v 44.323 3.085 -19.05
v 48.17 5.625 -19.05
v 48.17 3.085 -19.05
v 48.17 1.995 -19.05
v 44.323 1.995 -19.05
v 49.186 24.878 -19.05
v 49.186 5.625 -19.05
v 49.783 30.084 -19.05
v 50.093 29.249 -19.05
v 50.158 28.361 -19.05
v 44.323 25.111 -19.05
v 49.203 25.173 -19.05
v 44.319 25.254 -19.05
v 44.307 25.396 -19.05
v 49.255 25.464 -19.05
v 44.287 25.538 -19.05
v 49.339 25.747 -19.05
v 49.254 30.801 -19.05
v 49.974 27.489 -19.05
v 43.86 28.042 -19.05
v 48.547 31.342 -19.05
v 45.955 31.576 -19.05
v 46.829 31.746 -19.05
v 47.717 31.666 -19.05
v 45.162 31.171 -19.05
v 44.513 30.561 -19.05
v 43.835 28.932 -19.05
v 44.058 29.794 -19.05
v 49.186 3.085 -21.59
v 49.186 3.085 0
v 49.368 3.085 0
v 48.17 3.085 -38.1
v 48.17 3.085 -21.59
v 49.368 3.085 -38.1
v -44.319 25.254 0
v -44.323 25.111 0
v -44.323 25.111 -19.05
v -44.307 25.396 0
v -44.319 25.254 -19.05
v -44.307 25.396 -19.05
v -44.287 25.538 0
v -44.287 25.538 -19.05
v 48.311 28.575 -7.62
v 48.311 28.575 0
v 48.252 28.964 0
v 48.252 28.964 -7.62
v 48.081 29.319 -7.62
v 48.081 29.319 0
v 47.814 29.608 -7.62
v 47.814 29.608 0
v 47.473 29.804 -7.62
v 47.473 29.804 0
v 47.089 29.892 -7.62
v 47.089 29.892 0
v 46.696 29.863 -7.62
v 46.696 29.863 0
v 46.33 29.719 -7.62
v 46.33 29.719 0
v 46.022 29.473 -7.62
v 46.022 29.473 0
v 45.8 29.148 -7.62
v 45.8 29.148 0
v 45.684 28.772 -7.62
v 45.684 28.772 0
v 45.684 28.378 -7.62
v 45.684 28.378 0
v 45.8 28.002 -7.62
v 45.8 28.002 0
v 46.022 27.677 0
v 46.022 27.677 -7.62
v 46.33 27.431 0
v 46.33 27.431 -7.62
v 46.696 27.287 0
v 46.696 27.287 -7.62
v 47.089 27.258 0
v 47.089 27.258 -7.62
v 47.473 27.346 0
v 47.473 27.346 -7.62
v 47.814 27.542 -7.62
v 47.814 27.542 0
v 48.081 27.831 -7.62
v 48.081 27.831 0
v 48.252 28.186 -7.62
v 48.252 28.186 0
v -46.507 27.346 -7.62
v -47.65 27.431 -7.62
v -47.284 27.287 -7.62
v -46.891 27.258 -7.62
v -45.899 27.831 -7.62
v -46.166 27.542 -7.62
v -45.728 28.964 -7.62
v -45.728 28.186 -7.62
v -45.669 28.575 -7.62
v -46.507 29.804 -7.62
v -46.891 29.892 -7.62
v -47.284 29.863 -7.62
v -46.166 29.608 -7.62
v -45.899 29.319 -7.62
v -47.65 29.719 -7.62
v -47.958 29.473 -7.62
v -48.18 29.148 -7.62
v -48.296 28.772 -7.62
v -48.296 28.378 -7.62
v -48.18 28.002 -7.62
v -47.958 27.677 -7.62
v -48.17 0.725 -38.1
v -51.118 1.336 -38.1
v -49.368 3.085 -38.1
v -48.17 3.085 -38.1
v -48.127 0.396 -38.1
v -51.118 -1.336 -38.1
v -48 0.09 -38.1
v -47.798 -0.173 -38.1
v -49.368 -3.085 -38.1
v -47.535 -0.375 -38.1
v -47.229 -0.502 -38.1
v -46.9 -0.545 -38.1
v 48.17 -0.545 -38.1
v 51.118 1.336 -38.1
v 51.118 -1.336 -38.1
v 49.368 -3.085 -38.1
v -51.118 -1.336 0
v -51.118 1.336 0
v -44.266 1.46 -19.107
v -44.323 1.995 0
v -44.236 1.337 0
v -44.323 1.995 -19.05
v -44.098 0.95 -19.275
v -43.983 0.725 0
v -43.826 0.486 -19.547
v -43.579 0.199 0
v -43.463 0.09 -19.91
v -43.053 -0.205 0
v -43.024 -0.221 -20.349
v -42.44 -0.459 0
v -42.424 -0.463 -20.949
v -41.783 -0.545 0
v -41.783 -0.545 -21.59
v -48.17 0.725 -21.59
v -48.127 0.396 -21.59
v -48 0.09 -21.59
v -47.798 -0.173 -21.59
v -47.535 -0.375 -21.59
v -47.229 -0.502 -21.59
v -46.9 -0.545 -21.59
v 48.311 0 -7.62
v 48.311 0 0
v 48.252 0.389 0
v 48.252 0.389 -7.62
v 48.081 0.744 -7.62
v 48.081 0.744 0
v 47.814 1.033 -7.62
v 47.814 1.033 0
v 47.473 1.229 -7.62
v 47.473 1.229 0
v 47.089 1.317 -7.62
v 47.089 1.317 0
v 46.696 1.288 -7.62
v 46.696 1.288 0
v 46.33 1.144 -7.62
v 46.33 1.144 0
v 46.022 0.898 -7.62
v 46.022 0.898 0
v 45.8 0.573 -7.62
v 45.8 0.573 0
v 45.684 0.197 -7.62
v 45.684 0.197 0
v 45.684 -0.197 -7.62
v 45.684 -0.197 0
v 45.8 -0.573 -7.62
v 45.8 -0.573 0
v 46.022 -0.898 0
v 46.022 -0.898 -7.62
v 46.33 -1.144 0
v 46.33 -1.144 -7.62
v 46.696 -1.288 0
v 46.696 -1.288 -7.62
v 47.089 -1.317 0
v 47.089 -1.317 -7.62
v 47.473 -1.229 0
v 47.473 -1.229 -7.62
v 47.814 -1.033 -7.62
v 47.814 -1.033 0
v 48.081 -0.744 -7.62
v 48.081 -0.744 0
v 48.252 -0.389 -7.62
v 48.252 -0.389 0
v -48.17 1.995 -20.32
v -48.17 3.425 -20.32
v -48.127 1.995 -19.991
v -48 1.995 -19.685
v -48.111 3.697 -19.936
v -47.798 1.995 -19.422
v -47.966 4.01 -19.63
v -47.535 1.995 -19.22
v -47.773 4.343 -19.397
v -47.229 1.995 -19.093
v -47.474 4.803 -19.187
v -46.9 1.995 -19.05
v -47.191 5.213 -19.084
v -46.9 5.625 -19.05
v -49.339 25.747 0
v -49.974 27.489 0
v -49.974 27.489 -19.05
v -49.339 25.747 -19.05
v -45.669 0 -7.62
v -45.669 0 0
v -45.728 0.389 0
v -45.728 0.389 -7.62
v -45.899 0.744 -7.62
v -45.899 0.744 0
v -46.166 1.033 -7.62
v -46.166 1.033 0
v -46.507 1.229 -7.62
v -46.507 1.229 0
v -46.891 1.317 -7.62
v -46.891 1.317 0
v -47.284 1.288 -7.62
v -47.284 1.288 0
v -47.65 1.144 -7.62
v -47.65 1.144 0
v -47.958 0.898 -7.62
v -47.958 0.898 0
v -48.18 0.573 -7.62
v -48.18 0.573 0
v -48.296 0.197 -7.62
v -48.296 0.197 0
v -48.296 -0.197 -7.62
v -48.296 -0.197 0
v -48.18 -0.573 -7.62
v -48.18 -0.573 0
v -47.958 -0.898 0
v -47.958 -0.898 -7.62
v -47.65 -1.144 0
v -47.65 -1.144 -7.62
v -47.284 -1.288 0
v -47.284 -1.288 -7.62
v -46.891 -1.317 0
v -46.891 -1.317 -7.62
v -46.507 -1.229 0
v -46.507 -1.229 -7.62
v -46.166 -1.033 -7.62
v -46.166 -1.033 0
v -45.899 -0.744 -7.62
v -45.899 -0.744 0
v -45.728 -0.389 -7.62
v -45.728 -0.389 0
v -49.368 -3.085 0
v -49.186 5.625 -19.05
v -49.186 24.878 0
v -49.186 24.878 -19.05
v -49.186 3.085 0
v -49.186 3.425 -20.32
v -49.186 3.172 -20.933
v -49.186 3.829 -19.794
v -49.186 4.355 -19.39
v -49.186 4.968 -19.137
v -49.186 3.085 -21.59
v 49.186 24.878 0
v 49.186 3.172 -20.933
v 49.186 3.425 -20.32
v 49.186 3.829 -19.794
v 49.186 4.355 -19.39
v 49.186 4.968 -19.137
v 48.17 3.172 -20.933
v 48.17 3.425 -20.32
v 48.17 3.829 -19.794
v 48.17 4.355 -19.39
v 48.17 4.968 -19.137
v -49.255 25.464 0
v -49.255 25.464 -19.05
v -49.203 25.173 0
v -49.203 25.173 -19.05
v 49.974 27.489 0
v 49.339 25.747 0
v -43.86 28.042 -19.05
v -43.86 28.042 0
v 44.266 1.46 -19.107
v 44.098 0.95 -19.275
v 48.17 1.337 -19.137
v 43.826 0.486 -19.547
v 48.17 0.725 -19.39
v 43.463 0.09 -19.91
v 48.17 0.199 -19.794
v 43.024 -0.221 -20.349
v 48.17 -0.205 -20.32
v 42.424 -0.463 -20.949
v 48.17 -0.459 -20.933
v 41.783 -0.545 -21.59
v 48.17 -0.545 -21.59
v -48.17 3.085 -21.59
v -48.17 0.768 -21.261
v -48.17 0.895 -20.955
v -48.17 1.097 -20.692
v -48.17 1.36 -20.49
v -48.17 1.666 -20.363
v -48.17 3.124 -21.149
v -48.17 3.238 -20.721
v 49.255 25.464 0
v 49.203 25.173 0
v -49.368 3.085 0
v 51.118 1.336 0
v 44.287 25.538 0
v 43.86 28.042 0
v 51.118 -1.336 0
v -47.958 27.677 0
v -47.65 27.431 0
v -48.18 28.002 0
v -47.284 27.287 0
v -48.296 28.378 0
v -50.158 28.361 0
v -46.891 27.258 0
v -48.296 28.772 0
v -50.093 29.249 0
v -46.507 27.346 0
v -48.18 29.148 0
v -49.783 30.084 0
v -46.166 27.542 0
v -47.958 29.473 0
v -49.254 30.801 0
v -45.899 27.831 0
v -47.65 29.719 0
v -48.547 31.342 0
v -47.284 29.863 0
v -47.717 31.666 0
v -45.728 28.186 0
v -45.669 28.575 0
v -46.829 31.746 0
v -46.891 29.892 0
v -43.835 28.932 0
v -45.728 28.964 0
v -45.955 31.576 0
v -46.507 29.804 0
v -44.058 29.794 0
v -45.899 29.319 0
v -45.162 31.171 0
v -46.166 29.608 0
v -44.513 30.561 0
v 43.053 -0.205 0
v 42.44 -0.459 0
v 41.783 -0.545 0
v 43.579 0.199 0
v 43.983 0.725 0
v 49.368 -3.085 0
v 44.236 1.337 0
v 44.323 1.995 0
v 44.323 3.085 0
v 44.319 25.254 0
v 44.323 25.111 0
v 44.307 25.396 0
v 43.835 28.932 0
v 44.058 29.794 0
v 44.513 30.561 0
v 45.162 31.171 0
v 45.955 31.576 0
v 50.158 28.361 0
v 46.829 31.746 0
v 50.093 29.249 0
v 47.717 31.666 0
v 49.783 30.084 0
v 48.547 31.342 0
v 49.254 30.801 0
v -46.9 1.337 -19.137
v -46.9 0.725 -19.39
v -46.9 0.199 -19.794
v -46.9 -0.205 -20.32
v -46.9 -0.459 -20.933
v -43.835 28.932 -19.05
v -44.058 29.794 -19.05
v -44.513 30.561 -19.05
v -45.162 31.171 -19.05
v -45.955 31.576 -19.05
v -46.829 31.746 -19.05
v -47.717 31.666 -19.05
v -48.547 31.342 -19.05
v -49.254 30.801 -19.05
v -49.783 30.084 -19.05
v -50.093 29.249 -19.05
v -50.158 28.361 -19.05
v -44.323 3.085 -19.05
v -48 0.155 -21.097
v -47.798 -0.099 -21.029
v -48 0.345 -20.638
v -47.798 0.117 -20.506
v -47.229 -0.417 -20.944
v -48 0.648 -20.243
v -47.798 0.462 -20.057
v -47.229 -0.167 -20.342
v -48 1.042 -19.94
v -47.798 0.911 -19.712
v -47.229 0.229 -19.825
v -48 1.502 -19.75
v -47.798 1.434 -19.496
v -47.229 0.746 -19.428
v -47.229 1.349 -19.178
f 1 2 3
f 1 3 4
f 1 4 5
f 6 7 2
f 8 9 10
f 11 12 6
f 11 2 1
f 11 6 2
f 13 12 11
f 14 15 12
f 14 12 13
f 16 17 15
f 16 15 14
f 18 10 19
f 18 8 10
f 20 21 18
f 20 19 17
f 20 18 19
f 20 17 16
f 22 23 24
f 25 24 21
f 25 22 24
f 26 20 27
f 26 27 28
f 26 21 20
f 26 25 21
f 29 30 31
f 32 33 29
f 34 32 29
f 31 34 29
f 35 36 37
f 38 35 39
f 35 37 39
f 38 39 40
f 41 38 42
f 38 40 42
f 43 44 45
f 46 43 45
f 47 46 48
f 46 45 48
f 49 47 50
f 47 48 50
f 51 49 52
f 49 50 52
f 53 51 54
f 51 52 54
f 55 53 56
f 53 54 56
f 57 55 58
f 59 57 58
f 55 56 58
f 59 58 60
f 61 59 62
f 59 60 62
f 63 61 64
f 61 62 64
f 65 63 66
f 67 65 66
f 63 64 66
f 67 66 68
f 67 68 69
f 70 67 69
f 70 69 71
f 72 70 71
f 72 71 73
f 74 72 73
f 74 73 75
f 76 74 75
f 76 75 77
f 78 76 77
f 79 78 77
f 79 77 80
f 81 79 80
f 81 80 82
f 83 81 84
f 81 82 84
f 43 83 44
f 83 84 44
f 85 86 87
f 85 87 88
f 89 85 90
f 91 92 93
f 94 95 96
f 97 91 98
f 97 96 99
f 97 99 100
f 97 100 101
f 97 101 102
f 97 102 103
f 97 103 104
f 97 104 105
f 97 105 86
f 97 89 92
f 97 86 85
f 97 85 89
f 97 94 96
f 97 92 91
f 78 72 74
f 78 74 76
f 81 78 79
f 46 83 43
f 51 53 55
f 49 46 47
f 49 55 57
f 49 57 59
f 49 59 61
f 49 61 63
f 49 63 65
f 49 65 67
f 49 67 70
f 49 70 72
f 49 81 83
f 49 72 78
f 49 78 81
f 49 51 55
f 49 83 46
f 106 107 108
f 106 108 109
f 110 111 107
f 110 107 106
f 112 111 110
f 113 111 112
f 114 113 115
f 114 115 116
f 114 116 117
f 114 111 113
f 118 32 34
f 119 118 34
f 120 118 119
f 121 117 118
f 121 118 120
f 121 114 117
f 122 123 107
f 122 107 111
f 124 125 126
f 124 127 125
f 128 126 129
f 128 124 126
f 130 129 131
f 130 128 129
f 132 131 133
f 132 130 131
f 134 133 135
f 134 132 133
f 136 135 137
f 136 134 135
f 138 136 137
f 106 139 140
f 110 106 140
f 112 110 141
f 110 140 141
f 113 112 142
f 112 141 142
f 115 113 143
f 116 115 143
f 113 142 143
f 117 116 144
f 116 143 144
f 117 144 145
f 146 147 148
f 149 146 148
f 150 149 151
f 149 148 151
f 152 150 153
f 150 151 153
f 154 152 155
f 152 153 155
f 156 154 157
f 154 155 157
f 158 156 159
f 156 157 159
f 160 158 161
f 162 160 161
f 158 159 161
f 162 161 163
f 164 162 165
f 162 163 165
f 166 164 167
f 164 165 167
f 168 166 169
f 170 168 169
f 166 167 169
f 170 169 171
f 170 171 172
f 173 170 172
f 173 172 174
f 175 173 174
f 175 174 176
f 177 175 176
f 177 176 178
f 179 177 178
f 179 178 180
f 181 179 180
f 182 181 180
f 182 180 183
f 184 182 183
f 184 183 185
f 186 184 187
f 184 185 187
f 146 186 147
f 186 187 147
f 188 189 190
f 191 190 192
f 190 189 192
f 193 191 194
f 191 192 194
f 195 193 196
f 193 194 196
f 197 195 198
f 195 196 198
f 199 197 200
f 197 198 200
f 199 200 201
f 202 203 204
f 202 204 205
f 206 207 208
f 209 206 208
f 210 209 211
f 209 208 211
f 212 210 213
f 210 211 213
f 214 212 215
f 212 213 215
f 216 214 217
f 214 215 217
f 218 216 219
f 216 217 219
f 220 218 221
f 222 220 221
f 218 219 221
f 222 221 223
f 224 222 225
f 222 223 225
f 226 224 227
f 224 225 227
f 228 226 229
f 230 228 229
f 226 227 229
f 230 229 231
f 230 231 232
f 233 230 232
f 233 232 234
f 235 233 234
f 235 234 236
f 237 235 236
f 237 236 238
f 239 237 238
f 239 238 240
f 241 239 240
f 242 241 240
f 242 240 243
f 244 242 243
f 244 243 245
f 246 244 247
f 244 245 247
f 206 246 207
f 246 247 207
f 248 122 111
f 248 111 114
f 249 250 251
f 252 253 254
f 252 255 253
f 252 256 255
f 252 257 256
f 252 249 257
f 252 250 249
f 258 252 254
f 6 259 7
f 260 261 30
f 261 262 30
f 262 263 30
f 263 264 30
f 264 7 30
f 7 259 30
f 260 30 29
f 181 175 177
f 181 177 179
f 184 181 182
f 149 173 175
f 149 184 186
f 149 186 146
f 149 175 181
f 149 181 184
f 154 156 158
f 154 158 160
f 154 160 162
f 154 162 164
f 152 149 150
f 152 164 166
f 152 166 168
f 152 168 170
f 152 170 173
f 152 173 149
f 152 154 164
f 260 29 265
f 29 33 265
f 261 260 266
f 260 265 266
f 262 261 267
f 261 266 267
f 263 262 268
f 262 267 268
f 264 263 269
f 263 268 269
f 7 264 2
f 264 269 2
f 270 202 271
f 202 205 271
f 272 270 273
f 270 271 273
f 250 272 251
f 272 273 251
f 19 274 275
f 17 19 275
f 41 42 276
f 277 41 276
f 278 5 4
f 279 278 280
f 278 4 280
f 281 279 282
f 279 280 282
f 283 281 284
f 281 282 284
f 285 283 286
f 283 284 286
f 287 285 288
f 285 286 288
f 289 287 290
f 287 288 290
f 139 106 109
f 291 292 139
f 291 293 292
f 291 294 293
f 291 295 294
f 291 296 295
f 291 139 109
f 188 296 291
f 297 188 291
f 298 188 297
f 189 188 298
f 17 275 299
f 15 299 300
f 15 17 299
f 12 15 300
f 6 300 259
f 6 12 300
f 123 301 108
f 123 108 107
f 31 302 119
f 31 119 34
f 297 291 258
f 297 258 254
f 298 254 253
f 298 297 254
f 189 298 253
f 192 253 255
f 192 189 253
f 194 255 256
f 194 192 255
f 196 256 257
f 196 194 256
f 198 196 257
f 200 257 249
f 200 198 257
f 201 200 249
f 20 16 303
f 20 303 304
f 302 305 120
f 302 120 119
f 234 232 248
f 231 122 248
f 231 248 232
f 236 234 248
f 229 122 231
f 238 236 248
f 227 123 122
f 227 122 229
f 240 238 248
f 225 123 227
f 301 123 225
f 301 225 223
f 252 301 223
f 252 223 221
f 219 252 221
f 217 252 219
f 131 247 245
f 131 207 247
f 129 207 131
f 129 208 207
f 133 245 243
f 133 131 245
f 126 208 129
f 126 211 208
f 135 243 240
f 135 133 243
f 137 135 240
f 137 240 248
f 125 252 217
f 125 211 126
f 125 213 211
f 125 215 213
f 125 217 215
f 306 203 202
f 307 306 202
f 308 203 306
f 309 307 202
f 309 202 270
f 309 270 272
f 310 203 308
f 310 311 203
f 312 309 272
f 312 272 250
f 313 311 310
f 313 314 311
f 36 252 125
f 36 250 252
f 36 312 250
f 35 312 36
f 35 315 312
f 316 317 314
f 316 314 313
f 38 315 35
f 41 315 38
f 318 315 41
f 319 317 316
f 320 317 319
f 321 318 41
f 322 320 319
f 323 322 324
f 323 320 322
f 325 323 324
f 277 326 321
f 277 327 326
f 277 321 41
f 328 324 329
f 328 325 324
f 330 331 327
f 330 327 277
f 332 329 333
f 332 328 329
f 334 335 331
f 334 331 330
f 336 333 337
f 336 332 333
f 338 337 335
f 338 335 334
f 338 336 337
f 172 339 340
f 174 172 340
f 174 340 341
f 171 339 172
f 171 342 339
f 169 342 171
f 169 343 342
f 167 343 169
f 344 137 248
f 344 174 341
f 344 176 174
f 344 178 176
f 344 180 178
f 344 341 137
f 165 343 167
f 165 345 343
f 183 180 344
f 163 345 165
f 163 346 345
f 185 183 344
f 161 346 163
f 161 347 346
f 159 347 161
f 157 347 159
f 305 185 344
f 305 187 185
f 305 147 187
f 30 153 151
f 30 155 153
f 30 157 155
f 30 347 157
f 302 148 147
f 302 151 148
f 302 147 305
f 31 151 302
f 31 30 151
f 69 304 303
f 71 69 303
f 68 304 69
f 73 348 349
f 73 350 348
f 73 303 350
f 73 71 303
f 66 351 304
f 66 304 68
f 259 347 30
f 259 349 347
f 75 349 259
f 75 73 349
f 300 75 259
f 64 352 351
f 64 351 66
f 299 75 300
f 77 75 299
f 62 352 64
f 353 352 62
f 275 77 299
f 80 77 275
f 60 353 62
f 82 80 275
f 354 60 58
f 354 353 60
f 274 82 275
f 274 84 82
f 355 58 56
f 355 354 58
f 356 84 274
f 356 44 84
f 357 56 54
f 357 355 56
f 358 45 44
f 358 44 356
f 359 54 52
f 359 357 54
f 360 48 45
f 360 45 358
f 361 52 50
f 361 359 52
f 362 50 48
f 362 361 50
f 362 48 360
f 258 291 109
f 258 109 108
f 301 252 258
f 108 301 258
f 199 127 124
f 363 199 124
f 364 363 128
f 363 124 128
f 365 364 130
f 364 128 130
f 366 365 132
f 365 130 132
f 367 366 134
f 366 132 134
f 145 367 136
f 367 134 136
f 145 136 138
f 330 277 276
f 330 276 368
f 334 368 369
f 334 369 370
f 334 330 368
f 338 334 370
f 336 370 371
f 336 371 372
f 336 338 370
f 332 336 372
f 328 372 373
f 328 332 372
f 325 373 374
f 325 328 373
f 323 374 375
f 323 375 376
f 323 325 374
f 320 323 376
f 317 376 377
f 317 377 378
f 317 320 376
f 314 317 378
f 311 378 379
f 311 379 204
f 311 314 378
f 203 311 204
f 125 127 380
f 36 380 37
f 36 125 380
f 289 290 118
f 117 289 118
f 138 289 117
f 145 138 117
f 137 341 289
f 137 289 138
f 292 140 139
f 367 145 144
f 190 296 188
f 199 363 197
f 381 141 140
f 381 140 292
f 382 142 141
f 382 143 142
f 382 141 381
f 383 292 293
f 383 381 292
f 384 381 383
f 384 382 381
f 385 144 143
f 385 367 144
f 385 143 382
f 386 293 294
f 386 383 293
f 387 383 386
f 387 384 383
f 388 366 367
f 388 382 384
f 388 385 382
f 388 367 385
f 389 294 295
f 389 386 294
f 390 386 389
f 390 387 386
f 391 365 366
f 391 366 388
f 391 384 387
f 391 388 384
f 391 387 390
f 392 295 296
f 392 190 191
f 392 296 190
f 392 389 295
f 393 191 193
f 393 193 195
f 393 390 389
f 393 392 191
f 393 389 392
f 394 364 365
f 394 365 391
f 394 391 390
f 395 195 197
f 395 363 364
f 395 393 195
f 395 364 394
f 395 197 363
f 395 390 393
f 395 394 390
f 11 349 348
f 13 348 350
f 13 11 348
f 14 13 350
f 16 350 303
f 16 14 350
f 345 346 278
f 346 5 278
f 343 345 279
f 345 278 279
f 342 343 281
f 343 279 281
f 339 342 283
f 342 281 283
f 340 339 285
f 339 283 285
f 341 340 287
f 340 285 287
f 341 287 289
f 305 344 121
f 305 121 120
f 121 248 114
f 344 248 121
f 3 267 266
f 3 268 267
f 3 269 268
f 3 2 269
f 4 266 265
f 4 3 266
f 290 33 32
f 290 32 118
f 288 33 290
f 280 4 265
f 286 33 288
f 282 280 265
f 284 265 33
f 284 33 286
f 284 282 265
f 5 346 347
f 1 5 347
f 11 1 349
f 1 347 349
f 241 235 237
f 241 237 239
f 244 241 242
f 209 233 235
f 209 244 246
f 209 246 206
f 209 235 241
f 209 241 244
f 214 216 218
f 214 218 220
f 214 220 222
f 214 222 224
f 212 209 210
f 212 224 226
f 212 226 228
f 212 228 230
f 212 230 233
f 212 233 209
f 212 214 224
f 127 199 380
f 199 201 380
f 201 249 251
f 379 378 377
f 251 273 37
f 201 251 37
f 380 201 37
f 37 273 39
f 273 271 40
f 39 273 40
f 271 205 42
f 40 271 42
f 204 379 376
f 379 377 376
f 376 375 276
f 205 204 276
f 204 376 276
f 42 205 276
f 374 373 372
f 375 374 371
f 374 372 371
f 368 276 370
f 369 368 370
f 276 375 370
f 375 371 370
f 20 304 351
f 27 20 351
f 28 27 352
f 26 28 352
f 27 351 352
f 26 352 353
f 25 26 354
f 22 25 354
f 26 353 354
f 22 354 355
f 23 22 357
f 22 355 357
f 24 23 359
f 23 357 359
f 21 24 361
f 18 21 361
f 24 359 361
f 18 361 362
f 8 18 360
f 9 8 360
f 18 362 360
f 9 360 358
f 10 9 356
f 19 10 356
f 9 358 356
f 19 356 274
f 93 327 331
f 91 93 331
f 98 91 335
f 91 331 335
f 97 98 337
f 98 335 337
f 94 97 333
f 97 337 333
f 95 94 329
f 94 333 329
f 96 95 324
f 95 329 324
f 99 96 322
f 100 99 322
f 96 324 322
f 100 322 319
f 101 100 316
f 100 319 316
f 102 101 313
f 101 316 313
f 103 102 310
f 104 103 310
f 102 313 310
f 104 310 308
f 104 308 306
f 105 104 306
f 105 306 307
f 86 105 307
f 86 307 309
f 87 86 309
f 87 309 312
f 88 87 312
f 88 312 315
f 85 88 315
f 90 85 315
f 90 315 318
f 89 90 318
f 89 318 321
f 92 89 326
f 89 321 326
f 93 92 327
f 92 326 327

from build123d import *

# Parameters (mm, degrees)
BOSS_EXTRUDE1_DEPTH      = 101.6
SKETCH3_W                = 19.05
SKETCH3_H                = 15.24
BOSS_EXTRUDE3_DEPTH      = 2.54
BOSS_EXTRUDE4_DEPTH      = 3.175
SKETCH5_R                = 3.96875
CUT_EXTRUDE1_DEPTH       = 113.522583006
SKETCH18_W               = 3.847197439
SKETCH18_H               = 19.05
BOSS_EXTRUDE9_DEPTH      = 3.630394878
BOSS_EXTRUDE17_DEPTH     = 19.05
SKETCH20_R               = 1.3208
CUT_EXTRUDE7_DEPTH       = 7.62
FILLET3_R                = 2.54
FILLET4_R                = 2.54
CUT_EXTRUDE19_DEPTH      = 119.165702994
FILLET12_R               = 0.508
FILLET24_R               = 1.27
CUT_EXTRUDE20_DEPTH      = 119.230869843
CUT_EXTRUDE20_DEPTH_BACK = 119.230869843
SKETCH41_W               = 159.957489038
SKETCH41_H               = 86.494386596


with BuildPart() as part:
    # Sketch1 → Boss-Extrude1 (new body)
    with BuildSketch(Plane.XY):
        Polygon((-49.440197439, 3.085197439), (-51.308, 1.217394878), (-51.308, -1.217394878), (-49.440197439, -3.085197439), (49.440197439, -3.085197439), (51.308, -1.217394878), (51.308, 1.217394878), (49.440197439, 3.085197439), (48.170197439, 3.085197439), (48.170197439, -0.545197439), (-48.170197439, -0.545197439), (-48.170197439, 3.085197439), align=None)
    extrude(amount=-BOSS_EXTRUDE1_DEPTH)

    # Sketch3 → Boss-Extrude3 (add)
    with BuildSketch(Plane(origin=(0, 0, -101.6), x_dir=(-1, 0, 0), z_dir=(0, 0, -1))):
        with Locations((38.645197439, 7.074802561)):
            Rectangle(SKETCH3_W, SKETCH3_H)
    extrude(amount=-BOSS_EXTRUDE3_DEPTH)

    # Sketch4 → Boss-Extrude4 (add)
    with BuildSketch(Plane(origin=(-29.120197439, 0, 0), x_dir=(0, 0, -1), z_dir=(1, 0, 0))):
        Polygon((99.06, 14.694802561), (83.82, -0.545197439), (99.06, -0.545197439), align=None)
    boss_extrude4 = extrude(amount=-BOSS_EXTRUDE4_DEPTH)

    # Mirror1: Boss-Extrude4 across plane
    add(boss_extrude4.mirror(Plane(origin=(-38.645197439, 0, 0), x_dir=(0, 0, 1), z_dir=(1, 0, 0))))

    # Sketch5 → Cut-Extrude1 (cut, through all)
    with BuildSketch(Plane.XY.offset(-99.06)):
        with Locations((-38.6334, 6.985)):
            Circle(SKETCH5_R)
    extrude(amount=-CUT_EXTRUDE1_DEPTH, mode=Mode.SUBTRACT)

    # Sketch18 → Boss-Extrude9 (add)
    with BuildSketch(Plane(origin=(0, 3.085197439, 0), x_dir=(1, 0, 0), z_dir=(0, 1, 0))):
        with Locations((46.246598719, 9.525)):
            Rectangle(SKETCH18_W, SKETCH18_H)
        with Locations((-46.246598719, 9.525)):
            Rectangle(SKETCH18_W, SKETCH18_H)
    extrude(amount=-BOSS_EXTRUDE9_DEPTH)

    # Sketch39 → Boss-Extrude17 (add)
    with BuildSketch(Plane.XY):
        with BuildLine():
            Line((49.186197439, 3.085197439), (44.323, 3.085197439))
            Line((44.323, 3.085197439), (44.323, 25.325923901))
            Line((44.323, 25.325923901), (43.86013816, 28.041530355))
            ThreePointArc((43.86013816, 28.041530355), (47.275748779, 31.737115215), (49.973524071, 27.489086045))
            Line((49.973524071, 27.489086045), (49.186197439, 25.325923901))
            Line((49.186197439, 25.325923901), (49.186197439, 3.085197439))
        make_face()
    boss_extrude17 = extrude(amount=-BOSS_EXTRUDE17_DEPTH)

    # Mirror5: Boss-Extrude17 across plane
    add(boss_extrude17.mirror(Plane(origin=(0, 0, 0), x_dir=(0, 0, 1), z_dir=(1, 0, 0))))

    # Sketch20 → Cut-Extrude7 (cut)
    with BuildSketch(Plane.XY):
        with Locations((46.99, 0)):
            Circle(SKETCH20_R)
        with Locations((-46.99, 0)):
            Circle(SKETCH20_R)
        with Locations((-46.99, 28.575)):
            Circle(SKETCH20_R)
        with Locations((46.99, 28.575)):
            Circle(SKETCH20_R)
    extrude(amount=-CUT_EXTRUDE7_DEPTH, mode=Mode.SUBTRACT)

    # Fillet3
    fillet3_edges = [part.edges().sort_by_distance(p)[0] for p in [
        (44.323, 25.325923901, -9.525),
        (49.186197439, 25.325923901, -9.525),
        (-49.186197439, 25.325923901, -9.525),
        (-44.323, 25.325923901, -9.525),
    ]]
    fillet(fillet3_edges, radius=FILLET3_R)

    # Fillet4
    fillet4_edges = [part.edges().sort_by_distance(p)[0] for p in [
        (48.678197439, 3.085197439, -19.05),
        (-48.678197439, 3.085197439, -19.05),
        (44.323, -0.545197439, -9.525),
        (46.246598719, -0.545197439, -19.05),
        (-46.246598719, -0.545197439, -19.05),
        (-44.323, -0.545197439, -9.525),
    ]]
    fillet(fillet4_edges, radius=FILLET4_R)

    # Sketch40 → Cut-Extrude19 (cut, through all)
    with BuildSketch(Plane.XY):
        Polygon((-49.36835539, 3.085197439), (-51.1175, 1.336052829), (-51.1175, -1.336052829), (-49.36835539, -3.085197439), (-52.3875, -3.085197439), (-52.3875, 3.085197439), align=None)
        Polygon((52.3875, 3.085197439), (52.3875, -3.085197439), (49.36835539, -3.085197439), (51.1175, -1.336052829), (51.1175, 1.336052829), (49.36835539, 3.085197439), align=None)
    extrude(amount=-CUT_EXTRUDE19_DEPTH, mode=Mode.SUBTRACT)

    # Fillet12
    # the kernel refuses this fillet: 0.508 mm, written as the material it adds along each edge
    with BuildSketch(Plane(origin=(-48.170197439, 3.085197439, -86.180394878), x_dir=(-1, 0, 0), z_dir=(0, 0, -1))) as fillet12_piece_1_section:
        with BuildLine():
            CenterArc((FILLET12_R, FILLET12_R), FILLET12_R, 180, 90)
            Line((0, FILLET12_R), (0, 0))
            Line((0, 0), (FILLET12_R, 0))
        make_face()
    fillet12_piece_1 = extrude(amount=15.419605122, mode=Mode.PRIVATE)
    fillet12_piece_1 = split(fillet12_piece_1, bisect_by=Plane(origin=(-48.284048629, 6.707217092, -91.072414531), z_dir=(0, -0.7071067811865475, -0.7071067811865476)), keep=Keep.TOP, mode=Mode.PRIVATE)
    add(fillet12_piece_1)

    # Fillet24
    fillet24_edges = [part.edges().sort_by_distance(p)[0] for p in [
        (-48.170197439, 3.81, -19.05),
        (-48.170197439, 0.198751337, -19.793948776),
        (-48.170197439, -0.545197439, -52.705),
    ]]
    fillet(fillet24_edges, radius=FILLET24_R)

    # Sketch41 → Cut-Extrude20 (cut, two sides: drawn at the far end of the back side and taken through both)
    with BuildSketch(Plane(origin=(0, -0.545197439, 0), x_dir=(1, 0, 0), z_dir=(0, 1, 0)).offset(-CUT_EXTRUDE20_DEPTH_BACK)):
        with Locations((1.60361347, 81.347193298)):
            Rectangle(SKETCH41_W, SKETCH41_H)
    extrude(amount=CUT_EXTRUDE20_DEPTH + CUT_EXTRUDE20_DEPTH_BACK, mode=Mode.SUBTRACT)


solid = part.part
